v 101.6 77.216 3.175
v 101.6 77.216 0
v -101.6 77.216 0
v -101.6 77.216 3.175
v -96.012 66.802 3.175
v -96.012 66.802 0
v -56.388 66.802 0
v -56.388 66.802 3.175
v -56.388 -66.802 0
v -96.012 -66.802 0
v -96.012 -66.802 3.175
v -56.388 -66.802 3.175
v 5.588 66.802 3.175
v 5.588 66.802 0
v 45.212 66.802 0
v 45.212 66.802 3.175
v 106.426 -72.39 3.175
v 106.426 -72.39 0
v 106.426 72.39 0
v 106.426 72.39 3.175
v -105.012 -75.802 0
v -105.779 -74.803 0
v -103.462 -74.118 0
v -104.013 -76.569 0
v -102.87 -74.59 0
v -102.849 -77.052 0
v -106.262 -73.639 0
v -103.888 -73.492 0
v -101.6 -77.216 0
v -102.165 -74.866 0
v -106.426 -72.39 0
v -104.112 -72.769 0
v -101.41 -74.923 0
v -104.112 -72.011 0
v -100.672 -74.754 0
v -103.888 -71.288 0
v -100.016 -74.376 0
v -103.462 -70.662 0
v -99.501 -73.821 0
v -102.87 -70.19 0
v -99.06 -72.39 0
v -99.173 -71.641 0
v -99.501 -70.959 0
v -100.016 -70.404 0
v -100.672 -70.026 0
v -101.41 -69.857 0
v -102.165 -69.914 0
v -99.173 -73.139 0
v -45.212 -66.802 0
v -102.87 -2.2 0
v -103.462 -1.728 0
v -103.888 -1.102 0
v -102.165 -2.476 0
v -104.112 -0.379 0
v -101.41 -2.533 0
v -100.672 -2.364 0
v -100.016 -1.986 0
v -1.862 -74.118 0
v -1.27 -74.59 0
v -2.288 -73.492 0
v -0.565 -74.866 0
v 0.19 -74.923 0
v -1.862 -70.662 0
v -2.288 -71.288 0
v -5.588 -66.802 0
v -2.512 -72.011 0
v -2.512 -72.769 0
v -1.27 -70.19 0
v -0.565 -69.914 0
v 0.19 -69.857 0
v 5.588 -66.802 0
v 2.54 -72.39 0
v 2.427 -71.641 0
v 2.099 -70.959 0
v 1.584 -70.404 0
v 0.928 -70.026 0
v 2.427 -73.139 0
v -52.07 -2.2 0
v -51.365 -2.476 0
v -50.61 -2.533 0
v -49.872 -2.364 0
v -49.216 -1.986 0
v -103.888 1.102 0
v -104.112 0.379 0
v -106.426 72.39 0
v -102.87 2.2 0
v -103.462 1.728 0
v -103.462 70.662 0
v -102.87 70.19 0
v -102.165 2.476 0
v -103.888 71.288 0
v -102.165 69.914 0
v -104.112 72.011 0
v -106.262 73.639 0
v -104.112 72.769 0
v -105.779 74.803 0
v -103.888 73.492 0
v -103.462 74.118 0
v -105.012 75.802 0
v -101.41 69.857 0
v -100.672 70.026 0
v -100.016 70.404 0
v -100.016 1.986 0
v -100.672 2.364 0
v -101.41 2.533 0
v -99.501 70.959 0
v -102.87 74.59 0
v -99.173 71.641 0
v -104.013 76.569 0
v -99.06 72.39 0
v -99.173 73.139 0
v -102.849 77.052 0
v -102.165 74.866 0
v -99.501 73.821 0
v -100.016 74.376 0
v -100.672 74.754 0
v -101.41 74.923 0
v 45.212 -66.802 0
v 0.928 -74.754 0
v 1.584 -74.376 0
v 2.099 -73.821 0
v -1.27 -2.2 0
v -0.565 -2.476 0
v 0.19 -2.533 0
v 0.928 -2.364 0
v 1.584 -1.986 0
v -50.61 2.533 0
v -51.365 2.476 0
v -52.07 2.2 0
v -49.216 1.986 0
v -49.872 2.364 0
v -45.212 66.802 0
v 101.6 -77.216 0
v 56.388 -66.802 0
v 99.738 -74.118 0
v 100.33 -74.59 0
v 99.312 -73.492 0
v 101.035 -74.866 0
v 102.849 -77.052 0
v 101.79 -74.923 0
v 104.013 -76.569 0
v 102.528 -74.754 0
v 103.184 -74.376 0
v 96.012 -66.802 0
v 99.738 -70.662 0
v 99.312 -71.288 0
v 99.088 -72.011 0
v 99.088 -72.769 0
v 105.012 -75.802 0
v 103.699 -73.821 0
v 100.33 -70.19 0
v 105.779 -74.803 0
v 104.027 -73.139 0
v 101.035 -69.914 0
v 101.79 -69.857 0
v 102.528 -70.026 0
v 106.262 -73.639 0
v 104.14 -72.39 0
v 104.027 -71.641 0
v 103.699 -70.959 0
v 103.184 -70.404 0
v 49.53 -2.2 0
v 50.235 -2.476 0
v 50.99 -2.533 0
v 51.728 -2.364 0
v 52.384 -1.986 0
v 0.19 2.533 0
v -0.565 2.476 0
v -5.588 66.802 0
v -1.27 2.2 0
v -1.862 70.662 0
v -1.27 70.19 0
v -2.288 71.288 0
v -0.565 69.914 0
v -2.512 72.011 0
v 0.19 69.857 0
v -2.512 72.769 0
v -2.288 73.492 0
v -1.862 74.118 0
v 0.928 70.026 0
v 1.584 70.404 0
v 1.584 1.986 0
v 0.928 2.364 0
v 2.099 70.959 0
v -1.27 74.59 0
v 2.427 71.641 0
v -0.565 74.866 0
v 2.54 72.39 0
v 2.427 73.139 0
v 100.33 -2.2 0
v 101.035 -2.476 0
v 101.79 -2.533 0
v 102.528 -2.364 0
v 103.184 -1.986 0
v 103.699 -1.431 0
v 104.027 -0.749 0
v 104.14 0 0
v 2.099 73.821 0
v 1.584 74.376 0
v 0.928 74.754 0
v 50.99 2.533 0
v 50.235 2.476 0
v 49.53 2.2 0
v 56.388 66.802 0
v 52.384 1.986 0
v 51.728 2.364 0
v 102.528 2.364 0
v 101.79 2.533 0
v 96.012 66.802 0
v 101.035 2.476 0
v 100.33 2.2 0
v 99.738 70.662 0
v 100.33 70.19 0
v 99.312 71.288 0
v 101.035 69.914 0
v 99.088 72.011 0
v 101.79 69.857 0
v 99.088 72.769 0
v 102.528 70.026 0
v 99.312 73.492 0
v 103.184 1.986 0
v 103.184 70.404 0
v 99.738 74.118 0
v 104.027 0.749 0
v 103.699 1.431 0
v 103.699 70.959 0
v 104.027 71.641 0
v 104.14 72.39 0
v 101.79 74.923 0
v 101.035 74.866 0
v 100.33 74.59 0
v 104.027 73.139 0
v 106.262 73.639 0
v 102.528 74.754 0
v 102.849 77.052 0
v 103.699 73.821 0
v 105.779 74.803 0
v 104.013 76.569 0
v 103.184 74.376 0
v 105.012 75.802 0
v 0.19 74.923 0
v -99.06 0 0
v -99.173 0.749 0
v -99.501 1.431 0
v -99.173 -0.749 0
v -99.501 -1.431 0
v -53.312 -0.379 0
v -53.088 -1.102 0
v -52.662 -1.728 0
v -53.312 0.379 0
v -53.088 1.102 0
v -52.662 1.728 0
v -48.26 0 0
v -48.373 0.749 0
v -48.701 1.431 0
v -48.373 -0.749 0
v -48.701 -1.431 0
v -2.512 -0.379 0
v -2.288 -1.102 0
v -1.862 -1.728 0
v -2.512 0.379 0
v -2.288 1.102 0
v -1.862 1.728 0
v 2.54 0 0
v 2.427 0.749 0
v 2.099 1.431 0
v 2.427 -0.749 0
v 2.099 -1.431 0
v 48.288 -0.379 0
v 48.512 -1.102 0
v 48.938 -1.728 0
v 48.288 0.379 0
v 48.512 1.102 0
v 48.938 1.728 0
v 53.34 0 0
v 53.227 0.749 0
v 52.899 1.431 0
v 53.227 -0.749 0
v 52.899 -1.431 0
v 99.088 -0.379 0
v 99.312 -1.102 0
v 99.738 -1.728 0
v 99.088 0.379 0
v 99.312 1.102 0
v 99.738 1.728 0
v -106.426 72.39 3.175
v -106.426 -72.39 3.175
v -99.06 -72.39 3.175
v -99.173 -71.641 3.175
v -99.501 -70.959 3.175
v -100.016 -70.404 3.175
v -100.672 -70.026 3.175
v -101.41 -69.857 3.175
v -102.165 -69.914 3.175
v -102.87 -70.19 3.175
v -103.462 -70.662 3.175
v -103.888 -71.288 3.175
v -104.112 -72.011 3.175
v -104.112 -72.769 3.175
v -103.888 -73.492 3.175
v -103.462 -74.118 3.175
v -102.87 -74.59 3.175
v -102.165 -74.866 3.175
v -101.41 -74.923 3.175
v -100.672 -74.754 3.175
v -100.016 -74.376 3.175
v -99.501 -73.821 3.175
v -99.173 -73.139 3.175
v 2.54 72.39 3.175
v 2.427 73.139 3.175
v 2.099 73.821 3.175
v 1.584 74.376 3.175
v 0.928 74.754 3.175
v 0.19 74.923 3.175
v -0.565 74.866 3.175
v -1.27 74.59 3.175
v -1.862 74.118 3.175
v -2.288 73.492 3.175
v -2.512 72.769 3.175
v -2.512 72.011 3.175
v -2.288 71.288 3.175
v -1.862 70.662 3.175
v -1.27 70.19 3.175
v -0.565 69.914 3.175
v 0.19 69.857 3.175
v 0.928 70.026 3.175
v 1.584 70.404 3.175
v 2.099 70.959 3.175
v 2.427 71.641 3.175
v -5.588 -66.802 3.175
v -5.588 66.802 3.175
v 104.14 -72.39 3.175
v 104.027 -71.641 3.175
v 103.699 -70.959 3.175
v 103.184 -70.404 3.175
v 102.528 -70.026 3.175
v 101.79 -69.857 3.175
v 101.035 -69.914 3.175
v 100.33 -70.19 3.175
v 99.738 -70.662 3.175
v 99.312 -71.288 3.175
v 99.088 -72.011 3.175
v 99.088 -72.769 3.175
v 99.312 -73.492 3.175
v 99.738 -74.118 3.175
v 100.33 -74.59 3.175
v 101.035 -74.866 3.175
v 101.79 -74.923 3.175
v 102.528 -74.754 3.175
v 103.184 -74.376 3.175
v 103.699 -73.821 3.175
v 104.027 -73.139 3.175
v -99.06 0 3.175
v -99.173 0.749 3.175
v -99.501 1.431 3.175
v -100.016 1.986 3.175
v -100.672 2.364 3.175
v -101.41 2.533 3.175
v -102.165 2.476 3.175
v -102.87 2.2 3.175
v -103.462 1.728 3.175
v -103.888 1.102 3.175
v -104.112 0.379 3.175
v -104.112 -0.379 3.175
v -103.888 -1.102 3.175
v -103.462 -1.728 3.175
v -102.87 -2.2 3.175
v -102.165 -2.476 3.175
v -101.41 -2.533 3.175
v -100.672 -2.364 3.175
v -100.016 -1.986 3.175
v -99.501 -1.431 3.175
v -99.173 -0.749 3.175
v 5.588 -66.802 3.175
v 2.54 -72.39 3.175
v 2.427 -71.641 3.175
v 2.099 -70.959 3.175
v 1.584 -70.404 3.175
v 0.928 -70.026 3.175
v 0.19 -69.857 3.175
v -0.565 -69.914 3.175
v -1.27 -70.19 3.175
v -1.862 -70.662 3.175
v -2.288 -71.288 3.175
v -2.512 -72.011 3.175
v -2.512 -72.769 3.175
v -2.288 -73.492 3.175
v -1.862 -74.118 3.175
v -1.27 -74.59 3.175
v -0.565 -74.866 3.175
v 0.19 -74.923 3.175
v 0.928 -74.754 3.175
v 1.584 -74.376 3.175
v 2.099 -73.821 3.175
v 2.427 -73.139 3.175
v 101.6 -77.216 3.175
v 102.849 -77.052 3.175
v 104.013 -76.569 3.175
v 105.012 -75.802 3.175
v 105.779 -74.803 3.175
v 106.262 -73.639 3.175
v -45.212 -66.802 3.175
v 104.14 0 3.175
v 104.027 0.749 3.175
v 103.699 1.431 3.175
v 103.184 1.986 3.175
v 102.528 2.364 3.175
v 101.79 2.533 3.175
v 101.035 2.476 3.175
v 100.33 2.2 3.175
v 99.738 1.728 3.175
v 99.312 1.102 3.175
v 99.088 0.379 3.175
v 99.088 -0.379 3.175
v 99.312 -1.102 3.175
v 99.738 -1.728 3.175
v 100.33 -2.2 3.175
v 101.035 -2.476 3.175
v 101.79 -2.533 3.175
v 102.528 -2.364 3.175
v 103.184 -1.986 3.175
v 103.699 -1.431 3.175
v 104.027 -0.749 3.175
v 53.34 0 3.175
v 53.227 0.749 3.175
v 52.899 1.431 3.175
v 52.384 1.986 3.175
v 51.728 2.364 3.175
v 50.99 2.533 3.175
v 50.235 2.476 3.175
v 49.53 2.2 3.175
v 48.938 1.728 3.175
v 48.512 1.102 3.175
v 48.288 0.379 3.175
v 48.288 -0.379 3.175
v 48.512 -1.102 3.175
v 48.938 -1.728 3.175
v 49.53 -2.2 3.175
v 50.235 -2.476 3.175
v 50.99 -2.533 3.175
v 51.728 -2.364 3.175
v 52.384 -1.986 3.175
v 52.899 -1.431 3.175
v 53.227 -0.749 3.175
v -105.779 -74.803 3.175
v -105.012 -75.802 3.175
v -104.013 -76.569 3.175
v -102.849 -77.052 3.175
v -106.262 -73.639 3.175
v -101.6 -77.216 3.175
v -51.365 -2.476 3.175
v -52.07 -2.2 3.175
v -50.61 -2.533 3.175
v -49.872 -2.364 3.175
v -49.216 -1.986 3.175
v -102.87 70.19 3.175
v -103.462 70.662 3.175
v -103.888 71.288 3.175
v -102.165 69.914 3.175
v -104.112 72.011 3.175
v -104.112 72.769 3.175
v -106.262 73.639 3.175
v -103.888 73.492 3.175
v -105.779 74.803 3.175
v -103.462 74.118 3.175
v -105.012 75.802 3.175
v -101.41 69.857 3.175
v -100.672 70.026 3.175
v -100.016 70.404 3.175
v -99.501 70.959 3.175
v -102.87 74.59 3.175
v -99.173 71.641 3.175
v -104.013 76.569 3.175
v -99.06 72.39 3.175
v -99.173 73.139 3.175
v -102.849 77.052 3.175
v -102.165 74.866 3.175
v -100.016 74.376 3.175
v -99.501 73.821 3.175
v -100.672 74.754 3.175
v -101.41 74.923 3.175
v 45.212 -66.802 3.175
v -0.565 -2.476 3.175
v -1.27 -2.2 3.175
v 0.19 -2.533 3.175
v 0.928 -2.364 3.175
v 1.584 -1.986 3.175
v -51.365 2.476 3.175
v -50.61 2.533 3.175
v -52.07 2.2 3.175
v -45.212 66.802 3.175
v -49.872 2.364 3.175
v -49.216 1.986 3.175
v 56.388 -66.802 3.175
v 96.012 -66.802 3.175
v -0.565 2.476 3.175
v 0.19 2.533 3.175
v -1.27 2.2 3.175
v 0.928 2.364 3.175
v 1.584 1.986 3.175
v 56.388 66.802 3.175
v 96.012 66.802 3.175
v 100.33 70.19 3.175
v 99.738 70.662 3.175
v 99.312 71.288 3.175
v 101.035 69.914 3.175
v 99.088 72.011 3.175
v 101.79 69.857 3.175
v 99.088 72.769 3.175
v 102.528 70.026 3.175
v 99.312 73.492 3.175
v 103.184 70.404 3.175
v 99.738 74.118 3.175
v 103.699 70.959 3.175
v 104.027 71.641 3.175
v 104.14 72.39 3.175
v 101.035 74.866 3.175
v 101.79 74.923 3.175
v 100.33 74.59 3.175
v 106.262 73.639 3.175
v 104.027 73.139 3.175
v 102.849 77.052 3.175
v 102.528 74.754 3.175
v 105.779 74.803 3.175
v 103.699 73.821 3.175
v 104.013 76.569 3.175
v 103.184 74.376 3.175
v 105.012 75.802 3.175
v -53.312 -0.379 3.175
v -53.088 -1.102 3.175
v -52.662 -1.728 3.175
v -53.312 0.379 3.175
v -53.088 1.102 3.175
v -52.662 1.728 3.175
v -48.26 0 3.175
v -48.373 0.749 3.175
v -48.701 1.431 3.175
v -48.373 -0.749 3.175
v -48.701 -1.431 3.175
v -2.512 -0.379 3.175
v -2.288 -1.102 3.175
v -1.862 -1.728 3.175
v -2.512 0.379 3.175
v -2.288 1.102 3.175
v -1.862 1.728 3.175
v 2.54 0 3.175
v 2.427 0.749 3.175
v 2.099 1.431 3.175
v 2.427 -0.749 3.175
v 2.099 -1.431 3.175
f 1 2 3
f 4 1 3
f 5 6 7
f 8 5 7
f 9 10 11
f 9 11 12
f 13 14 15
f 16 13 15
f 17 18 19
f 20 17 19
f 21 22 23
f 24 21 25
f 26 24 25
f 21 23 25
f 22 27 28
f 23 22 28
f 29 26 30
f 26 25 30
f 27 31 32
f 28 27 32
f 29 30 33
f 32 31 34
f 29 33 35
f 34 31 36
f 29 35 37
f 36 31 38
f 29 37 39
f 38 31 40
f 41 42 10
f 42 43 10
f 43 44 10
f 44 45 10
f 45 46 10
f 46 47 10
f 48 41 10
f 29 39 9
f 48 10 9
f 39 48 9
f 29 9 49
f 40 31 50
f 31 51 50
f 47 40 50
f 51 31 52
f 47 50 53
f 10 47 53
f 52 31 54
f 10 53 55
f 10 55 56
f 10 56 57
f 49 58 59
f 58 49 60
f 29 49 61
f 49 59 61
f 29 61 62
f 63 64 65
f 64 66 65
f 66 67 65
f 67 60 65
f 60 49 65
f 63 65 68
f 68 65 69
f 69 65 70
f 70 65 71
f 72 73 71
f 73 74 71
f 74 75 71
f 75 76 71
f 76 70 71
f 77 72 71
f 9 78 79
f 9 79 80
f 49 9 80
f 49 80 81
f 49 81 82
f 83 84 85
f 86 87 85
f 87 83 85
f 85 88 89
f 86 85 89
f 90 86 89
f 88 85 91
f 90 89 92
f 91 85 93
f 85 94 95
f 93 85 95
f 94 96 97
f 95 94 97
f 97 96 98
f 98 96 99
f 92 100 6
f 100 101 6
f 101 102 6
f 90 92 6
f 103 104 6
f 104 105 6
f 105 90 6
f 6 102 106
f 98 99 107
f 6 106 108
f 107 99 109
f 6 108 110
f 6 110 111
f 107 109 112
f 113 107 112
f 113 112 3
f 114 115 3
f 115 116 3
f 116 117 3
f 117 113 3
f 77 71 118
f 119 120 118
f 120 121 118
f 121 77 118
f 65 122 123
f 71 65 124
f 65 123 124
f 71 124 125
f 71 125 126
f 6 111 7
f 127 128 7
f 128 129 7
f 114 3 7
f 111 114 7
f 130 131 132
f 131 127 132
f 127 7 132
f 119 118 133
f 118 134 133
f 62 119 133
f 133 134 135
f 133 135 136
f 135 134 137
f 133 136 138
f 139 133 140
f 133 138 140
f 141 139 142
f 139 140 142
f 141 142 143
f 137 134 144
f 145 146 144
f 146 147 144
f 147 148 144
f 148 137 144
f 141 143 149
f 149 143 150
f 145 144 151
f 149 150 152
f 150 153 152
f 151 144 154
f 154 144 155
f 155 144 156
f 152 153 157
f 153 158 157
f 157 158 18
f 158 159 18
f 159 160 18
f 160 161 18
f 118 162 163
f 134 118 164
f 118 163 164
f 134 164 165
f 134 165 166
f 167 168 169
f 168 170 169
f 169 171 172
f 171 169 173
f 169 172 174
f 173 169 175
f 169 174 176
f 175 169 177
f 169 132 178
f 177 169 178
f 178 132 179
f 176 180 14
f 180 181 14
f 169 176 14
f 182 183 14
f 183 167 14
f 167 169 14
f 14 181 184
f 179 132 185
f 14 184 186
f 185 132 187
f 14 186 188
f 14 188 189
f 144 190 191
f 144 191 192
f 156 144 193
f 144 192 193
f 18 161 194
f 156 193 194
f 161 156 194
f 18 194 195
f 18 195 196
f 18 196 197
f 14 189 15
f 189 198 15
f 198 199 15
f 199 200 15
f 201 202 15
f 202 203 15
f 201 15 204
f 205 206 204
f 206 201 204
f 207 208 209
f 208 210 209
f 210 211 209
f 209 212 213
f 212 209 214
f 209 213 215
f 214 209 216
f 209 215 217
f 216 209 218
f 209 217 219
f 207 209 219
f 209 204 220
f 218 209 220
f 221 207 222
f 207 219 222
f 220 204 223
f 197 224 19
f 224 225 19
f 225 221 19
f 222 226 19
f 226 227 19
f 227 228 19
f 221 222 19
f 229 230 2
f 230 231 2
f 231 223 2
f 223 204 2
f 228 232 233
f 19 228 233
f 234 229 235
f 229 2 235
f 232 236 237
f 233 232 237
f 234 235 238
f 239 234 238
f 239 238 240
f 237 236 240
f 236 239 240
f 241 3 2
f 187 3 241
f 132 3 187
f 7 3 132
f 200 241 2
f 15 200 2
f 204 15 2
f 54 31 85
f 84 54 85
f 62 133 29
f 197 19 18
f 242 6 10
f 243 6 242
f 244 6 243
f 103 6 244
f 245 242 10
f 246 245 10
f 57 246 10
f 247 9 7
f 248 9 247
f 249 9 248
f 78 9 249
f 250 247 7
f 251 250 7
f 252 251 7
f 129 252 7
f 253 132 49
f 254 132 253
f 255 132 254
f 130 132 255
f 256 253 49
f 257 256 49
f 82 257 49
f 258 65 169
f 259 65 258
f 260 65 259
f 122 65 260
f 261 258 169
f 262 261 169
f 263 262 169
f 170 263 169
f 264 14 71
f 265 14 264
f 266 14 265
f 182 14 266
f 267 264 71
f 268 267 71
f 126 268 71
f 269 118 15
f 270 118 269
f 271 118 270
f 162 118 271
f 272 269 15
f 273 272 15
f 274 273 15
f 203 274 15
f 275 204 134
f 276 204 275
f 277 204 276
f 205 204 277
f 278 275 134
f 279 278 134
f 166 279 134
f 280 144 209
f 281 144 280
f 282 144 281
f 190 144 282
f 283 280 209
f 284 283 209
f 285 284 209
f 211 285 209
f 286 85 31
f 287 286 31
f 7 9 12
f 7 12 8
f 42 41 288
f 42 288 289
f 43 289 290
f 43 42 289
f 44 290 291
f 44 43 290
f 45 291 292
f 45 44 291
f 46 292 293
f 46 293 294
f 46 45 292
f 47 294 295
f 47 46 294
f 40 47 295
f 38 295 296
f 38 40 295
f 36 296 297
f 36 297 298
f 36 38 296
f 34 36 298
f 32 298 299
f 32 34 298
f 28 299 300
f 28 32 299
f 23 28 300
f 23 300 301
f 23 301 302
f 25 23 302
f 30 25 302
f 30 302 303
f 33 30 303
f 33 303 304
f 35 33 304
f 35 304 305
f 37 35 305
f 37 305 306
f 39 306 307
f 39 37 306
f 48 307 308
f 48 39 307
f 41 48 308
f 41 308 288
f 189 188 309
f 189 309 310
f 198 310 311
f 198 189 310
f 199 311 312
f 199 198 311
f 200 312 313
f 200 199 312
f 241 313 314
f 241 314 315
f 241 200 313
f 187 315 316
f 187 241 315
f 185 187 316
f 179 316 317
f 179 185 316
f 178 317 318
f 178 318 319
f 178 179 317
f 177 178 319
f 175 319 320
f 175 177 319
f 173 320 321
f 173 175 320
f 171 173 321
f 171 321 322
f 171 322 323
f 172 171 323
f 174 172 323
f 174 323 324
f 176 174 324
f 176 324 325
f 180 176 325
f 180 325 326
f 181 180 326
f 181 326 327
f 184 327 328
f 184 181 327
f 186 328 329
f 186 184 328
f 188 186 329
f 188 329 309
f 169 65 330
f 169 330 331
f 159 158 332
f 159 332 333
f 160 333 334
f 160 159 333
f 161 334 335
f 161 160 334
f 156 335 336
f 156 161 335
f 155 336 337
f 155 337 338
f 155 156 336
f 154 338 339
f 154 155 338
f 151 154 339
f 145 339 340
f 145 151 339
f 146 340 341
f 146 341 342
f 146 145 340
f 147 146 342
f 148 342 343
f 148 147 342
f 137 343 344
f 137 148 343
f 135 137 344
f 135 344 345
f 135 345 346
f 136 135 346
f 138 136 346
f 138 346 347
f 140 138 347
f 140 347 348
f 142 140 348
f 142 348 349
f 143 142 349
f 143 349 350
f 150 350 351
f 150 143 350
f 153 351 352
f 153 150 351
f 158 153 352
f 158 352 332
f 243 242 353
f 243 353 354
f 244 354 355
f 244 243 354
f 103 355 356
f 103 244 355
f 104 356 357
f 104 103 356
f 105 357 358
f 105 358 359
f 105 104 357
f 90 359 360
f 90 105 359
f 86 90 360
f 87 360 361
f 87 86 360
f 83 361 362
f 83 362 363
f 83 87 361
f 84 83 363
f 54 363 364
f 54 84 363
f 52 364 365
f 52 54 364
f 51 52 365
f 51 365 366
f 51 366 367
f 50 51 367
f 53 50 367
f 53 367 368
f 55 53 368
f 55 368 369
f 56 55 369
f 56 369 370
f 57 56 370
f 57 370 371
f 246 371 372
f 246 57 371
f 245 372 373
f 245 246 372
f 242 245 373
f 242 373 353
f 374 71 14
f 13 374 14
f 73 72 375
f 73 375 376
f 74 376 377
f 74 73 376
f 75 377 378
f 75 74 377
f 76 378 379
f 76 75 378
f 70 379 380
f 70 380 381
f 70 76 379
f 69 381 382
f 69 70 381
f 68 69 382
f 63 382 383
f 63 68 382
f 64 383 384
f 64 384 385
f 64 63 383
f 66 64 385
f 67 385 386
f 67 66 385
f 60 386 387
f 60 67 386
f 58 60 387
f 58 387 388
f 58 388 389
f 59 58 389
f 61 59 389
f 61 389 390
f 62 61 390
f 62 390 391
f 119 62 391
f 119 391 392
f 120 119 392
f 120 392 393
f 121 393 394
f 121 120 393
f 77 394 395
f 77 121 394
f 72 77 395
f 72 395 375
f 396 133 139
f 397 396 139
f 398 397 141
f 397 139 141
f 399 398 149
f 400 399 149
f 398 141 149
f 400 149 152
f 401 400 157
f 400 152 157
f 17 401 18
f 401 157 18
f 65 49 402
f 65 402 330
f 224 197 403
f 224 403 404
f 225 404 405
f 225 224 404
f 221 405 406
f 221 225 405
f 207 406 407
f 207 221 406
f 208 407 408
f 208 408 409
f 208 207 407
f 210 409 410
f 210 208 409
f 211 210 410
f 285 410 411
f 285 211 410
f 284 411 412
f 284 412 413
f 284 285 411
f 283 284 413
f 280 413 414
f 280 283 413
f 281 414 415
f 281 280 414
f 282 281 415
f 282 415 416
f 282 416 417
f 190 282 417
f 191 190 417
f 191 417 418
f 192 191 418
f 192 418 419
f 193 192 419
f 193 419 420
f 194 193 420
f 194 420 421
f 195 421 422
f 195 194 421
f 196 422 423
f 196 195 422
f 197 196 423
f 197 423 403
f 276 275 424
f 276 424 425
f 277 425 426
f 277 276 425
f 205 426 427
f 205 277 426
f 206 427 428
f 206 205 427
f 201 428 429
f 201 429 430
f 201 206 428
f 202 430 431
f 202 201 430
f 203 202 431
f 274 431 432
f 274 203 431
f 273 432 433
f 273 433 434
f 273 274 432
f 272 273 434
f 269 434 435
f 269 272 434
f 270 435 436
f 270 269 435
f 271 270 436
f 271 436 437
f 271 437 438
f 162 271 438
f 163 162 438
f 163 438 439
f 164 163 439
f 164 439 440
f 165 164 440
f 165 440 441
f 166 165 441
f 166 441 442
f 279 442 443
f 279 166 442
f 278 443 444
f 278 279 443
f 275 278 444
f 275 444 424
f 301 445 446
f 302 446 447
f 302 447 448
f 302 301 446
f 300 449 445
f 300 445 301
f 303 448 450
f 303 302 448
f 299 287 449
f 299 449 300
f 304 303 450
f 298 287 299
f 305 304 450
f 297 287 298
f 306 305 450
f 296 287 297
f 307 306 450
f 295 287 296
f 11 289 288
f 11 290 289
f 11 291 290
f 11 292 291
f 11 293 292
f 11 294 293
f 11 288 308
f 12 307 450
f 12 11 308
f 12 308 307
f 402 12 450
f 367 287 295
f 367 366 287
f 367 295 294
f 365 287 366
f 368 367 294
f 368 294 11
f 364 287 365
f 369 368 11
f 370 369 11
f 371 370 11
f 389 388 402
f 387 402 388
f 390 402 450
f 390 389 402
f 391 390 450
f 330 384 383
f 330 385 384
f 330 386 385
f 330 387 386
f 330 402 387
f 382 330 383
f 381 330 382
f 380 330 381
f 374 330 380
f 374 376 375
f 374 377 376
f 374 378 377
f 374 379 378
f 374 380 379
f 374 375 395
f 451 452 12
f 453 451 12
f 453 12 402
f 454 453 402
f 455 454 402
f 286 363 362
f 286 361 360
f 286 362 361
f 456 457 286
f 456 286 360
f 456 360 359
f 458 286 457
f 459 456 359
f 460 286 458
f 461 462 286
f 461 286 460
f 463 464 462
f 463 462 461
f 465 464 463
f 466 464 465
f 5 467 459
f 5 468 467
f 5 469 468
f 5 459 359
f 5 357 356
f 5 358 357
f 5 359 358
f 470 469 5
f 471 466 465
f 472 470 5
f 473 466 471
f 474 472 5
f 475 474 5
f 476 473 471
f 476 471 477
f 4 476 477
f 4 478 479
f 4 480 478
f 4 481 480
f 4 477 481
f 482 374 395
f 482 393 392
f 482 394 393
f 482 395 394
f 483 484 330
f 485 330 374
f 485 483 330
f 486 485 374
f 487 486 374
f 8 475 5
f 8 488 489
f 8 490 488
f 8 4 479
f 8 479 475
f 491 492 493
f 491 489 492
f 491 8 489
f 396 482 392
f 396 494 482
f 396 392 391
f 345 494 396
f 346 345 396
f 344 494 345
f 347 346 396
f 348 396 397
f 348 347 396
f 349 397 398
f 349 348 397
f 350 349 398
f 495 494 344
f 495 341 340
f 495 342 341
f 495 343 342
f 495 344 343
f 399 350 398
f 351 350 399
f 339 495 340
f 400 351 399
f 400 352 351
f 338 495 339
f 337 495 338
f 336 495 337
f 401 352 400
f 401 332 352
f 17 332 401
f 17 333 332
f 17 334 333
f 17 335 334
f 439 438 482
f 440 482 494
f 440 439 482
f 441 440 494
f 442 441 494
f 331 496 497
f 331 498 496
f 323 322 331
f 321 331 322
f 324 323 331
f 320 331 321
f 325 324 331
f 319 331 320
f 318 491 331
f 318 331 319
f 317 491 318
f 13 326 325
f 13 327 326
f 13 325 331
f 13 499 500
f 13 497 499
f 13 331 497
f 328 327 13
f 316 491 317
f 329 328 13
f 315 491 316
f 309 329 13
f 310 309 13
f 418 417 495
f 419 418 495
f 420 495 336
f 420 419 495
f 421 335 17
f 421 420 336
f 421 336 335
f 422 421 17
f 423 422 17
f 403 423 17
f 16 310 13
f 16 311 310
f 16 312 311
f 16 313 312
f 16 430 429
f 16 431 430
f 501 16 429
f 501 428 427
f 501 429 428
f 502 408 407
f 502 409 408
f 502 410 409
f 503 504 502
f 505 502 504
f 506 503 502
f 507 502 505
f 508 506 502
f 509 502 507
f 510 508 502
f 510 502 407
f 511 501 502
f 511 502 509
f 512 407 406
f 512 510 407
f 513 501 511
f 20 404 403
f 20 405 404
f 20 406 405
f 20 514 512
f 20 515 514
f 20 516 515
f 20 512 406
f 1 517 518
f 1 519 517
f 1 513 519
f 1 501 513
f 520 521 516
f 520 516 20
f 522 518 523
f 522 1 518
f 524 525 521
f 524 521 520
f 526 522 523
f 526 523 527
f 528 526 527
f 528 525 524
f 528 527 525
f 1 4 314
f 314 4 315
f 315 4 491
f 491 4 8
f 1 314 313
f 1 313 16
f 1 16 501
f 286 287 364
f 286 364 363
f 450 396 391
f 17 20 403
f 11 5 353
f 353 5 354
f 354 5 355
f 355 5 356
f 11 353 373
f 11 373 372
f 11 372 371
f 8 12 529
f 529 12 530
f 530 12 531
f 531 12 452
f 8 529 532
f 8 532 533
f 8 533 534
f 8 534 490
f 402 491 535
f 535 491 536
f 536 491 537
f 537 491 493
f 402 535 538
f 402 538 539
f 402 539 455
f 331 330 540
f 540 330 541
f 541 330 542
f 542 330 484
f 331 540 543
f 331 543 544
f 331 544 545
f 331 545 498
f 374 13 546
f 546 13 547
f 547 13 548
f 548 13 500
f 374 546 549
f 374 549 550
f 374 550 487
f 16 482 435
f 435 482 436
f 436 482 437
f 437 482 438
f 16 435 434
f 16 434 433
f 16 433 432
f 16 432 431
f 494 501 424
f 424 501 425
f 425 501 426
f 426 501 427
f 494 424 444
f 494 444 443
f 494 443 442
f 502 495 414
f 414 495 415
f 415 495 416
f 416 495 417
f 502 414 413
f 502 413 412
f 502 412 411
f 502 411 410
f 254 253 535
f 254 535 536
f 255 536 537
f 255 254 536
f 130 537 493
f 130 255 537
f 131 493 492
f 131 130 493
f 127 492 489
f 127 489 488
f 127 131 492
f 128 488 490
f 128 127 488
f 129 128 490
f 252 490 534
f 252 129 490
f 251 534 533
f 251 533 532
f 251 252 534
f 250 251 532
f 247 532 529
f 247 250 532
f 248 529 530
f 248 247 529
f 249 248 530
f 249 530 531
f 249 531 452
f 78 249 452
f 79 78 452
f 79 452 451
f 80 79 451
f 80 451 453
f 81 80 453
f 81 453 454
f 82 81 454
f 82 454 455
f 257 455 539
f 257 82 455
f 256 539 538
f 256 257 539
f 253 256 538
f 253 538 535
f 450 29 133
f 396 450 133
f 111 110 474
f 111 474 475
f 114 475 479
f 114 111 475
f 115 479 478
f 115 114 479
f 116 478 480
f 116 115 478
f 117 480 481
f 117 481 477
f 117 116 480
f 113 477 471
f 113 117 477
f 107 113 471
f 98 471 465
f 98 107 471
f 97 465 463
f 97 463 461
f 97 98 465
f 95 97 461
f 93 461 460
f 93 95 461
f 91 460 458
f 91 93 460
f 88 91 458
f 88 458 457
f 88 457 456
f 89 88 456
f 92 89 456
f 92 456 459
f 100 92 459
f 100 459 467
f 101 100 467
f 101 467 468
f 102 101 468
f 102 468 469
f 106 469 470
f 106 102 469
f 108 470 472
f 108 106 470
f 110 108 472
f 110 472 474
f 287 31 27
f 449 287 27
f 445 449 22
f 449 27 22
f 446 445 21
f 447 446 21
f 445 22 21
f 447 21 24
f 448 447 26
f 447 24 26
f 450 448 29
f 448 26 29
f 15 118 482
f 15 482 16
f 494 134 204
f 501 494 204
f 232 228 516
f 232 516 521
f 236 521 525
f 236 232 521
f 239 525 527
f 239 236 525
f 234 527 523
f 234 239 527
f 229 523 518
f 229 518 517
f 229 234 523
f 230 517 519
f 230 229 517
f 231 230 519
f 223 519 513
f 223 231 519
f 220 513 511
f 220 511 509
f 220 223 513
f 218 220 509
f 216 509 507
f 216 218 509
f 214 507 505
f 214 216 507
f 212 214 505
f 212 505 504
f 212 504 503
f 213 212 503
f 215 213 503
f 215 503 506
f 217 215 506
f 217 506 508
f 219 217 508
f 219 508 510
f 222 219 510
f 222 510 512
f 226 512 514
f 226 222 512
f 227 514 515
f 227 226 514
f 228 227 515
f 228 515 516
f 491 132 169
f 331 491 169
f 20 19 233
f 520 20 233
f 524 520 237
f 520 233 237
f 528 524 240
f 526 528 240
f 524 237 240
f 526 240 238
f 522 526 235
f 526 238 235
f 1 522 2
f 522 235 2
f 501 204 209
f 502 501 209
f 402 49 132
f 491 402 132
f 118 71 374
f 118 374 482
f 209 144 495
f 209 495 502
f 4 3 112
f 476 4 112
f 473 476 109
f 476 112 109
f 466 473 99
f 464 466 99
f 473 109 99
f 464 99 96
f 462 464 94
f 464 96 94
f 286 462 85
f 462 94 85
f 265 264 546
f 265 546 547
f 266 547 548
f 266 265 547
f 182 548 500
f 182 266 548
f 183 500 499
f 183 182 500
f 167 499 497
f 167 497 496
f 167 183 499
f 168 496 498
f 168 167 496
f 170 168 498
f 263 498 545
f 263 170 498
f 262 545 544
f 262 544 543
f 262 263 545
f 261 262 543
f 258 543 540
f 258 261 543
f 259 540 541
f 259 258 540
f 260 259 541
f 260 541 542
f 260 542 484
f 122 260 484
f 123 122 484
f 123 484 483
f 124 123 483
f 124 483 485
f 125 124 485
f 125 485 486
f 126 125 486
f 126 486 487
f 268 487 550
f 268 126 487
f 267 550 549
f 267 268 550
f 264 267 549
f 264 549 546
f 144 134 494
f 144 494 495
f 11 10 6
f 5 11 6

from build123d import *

# Parameters (mm, degrees)
SKETCH1_R           = 2.54
SKETCH1_W           = 39.624
SKETCH1_H           = 133.604
BOSS_EXTRUDE1_DEPTH = 3.175


with BuildPart() as part:
    # Sketch1 → Boss-Extrude1 (new body)
    with BuildSketch(Plane.XY):
        with BuildLine():
            Line((106.426, 24.765), (106.426, 72.39))
            ThreePointArc((106.426, 72.39), (105.012497326, 75.802497326), (101.6, 77.216))
            Line((101.6, 77.216), (-101.6, 77.216))
            ThreePointArc((-101.6, 77.216), (-105.012497326, 75.802497326), (-106.426, 72.39))
            Line((-106.426, 72.39), (-106.426, 24.765))
            Line((-106.426, 24.765), (-106.426, -24.765))
            Line((-106.426, -24.765), (-106.426, -72.39))
            ThreePointArc((-106.426, -72.39), (-105.012497326, -75.802497326), (-101.6, -77.216))
            Line((-101.6, -77.216), (101.6, -77.216))
            ThreePointArc((101.6, -77.216), (105.012497326, -75.802497326), (106.426, -72.39))
            Line((106.426, -72.39), (106.426, -24.765))
            Line((106.426, -24.765), (106.426, 24.765))
        make_face()
        with Locations((-101.6, -72.39)):
            Circle(SKETCH1_R, mode=Mode.SUBTRACT)
        with Locations((0, -72.39)):
            Circle(SKETCH1_R, mode=Mode.SUBTRACT)
        with Locations((25.4, 0)):
            Rectangle(SKETCH1_W, SKETCH1_H, mode=Mode.SUBTRACT)
        with Locations((101.6, -72.39)):
            Circle(SKETCH1_R, mode=Mode.SUBTRACT)
        with Locations((-101.6, 0)):
            Circle(SKETCH1_R, mode=Mode.SUBTRACT)
        with Locations((-76.2, 0)):
            Rectangle(SKETCH1_W, SKETCH1_H, mode=Mode.SUBTRACT)
        with Locations((-101.6, 72.39)):
            Circle(SKETCH1_R, mode=Mode.SUBTRACT)
        with Locations((-50.8, 0)):
            Circle(SKETCH1_R, mode=Mode.SUBTRACT)
        with Locations((-25.4, 0)):
            Rectangle(SKETCH1_W, SKETCH1_H, mode=Mode.SUBTRACT)
        Circle(SKETCH1_R, mode=Mode.SUBTRACT)
        with Locations((50.8, 0)):
            Circle(SKETCH1_R, mode=Mode.SUBTRACT)
        with Locations((0, 72.39)):
            Circle(SKETCH1_R, mode=Mode.SUBTRACT)
        with Locations((76.2, 0)):
            Rectangle(SKETCH1_W, SKETCH1_H, mode=Mode.SUBTRACT)
        with Locations((101.6, 0)):
            Circle(SKETCH1_R, mode=Mode.SUBTRACT)
        with Locations((101.6, 72.39)):
            Circle(SKETCH1_R, mode=Mode.SUBTRACT)
    extrude(amount=BOSS_EXTRUDE1_DEPTH)


solid = part.part
